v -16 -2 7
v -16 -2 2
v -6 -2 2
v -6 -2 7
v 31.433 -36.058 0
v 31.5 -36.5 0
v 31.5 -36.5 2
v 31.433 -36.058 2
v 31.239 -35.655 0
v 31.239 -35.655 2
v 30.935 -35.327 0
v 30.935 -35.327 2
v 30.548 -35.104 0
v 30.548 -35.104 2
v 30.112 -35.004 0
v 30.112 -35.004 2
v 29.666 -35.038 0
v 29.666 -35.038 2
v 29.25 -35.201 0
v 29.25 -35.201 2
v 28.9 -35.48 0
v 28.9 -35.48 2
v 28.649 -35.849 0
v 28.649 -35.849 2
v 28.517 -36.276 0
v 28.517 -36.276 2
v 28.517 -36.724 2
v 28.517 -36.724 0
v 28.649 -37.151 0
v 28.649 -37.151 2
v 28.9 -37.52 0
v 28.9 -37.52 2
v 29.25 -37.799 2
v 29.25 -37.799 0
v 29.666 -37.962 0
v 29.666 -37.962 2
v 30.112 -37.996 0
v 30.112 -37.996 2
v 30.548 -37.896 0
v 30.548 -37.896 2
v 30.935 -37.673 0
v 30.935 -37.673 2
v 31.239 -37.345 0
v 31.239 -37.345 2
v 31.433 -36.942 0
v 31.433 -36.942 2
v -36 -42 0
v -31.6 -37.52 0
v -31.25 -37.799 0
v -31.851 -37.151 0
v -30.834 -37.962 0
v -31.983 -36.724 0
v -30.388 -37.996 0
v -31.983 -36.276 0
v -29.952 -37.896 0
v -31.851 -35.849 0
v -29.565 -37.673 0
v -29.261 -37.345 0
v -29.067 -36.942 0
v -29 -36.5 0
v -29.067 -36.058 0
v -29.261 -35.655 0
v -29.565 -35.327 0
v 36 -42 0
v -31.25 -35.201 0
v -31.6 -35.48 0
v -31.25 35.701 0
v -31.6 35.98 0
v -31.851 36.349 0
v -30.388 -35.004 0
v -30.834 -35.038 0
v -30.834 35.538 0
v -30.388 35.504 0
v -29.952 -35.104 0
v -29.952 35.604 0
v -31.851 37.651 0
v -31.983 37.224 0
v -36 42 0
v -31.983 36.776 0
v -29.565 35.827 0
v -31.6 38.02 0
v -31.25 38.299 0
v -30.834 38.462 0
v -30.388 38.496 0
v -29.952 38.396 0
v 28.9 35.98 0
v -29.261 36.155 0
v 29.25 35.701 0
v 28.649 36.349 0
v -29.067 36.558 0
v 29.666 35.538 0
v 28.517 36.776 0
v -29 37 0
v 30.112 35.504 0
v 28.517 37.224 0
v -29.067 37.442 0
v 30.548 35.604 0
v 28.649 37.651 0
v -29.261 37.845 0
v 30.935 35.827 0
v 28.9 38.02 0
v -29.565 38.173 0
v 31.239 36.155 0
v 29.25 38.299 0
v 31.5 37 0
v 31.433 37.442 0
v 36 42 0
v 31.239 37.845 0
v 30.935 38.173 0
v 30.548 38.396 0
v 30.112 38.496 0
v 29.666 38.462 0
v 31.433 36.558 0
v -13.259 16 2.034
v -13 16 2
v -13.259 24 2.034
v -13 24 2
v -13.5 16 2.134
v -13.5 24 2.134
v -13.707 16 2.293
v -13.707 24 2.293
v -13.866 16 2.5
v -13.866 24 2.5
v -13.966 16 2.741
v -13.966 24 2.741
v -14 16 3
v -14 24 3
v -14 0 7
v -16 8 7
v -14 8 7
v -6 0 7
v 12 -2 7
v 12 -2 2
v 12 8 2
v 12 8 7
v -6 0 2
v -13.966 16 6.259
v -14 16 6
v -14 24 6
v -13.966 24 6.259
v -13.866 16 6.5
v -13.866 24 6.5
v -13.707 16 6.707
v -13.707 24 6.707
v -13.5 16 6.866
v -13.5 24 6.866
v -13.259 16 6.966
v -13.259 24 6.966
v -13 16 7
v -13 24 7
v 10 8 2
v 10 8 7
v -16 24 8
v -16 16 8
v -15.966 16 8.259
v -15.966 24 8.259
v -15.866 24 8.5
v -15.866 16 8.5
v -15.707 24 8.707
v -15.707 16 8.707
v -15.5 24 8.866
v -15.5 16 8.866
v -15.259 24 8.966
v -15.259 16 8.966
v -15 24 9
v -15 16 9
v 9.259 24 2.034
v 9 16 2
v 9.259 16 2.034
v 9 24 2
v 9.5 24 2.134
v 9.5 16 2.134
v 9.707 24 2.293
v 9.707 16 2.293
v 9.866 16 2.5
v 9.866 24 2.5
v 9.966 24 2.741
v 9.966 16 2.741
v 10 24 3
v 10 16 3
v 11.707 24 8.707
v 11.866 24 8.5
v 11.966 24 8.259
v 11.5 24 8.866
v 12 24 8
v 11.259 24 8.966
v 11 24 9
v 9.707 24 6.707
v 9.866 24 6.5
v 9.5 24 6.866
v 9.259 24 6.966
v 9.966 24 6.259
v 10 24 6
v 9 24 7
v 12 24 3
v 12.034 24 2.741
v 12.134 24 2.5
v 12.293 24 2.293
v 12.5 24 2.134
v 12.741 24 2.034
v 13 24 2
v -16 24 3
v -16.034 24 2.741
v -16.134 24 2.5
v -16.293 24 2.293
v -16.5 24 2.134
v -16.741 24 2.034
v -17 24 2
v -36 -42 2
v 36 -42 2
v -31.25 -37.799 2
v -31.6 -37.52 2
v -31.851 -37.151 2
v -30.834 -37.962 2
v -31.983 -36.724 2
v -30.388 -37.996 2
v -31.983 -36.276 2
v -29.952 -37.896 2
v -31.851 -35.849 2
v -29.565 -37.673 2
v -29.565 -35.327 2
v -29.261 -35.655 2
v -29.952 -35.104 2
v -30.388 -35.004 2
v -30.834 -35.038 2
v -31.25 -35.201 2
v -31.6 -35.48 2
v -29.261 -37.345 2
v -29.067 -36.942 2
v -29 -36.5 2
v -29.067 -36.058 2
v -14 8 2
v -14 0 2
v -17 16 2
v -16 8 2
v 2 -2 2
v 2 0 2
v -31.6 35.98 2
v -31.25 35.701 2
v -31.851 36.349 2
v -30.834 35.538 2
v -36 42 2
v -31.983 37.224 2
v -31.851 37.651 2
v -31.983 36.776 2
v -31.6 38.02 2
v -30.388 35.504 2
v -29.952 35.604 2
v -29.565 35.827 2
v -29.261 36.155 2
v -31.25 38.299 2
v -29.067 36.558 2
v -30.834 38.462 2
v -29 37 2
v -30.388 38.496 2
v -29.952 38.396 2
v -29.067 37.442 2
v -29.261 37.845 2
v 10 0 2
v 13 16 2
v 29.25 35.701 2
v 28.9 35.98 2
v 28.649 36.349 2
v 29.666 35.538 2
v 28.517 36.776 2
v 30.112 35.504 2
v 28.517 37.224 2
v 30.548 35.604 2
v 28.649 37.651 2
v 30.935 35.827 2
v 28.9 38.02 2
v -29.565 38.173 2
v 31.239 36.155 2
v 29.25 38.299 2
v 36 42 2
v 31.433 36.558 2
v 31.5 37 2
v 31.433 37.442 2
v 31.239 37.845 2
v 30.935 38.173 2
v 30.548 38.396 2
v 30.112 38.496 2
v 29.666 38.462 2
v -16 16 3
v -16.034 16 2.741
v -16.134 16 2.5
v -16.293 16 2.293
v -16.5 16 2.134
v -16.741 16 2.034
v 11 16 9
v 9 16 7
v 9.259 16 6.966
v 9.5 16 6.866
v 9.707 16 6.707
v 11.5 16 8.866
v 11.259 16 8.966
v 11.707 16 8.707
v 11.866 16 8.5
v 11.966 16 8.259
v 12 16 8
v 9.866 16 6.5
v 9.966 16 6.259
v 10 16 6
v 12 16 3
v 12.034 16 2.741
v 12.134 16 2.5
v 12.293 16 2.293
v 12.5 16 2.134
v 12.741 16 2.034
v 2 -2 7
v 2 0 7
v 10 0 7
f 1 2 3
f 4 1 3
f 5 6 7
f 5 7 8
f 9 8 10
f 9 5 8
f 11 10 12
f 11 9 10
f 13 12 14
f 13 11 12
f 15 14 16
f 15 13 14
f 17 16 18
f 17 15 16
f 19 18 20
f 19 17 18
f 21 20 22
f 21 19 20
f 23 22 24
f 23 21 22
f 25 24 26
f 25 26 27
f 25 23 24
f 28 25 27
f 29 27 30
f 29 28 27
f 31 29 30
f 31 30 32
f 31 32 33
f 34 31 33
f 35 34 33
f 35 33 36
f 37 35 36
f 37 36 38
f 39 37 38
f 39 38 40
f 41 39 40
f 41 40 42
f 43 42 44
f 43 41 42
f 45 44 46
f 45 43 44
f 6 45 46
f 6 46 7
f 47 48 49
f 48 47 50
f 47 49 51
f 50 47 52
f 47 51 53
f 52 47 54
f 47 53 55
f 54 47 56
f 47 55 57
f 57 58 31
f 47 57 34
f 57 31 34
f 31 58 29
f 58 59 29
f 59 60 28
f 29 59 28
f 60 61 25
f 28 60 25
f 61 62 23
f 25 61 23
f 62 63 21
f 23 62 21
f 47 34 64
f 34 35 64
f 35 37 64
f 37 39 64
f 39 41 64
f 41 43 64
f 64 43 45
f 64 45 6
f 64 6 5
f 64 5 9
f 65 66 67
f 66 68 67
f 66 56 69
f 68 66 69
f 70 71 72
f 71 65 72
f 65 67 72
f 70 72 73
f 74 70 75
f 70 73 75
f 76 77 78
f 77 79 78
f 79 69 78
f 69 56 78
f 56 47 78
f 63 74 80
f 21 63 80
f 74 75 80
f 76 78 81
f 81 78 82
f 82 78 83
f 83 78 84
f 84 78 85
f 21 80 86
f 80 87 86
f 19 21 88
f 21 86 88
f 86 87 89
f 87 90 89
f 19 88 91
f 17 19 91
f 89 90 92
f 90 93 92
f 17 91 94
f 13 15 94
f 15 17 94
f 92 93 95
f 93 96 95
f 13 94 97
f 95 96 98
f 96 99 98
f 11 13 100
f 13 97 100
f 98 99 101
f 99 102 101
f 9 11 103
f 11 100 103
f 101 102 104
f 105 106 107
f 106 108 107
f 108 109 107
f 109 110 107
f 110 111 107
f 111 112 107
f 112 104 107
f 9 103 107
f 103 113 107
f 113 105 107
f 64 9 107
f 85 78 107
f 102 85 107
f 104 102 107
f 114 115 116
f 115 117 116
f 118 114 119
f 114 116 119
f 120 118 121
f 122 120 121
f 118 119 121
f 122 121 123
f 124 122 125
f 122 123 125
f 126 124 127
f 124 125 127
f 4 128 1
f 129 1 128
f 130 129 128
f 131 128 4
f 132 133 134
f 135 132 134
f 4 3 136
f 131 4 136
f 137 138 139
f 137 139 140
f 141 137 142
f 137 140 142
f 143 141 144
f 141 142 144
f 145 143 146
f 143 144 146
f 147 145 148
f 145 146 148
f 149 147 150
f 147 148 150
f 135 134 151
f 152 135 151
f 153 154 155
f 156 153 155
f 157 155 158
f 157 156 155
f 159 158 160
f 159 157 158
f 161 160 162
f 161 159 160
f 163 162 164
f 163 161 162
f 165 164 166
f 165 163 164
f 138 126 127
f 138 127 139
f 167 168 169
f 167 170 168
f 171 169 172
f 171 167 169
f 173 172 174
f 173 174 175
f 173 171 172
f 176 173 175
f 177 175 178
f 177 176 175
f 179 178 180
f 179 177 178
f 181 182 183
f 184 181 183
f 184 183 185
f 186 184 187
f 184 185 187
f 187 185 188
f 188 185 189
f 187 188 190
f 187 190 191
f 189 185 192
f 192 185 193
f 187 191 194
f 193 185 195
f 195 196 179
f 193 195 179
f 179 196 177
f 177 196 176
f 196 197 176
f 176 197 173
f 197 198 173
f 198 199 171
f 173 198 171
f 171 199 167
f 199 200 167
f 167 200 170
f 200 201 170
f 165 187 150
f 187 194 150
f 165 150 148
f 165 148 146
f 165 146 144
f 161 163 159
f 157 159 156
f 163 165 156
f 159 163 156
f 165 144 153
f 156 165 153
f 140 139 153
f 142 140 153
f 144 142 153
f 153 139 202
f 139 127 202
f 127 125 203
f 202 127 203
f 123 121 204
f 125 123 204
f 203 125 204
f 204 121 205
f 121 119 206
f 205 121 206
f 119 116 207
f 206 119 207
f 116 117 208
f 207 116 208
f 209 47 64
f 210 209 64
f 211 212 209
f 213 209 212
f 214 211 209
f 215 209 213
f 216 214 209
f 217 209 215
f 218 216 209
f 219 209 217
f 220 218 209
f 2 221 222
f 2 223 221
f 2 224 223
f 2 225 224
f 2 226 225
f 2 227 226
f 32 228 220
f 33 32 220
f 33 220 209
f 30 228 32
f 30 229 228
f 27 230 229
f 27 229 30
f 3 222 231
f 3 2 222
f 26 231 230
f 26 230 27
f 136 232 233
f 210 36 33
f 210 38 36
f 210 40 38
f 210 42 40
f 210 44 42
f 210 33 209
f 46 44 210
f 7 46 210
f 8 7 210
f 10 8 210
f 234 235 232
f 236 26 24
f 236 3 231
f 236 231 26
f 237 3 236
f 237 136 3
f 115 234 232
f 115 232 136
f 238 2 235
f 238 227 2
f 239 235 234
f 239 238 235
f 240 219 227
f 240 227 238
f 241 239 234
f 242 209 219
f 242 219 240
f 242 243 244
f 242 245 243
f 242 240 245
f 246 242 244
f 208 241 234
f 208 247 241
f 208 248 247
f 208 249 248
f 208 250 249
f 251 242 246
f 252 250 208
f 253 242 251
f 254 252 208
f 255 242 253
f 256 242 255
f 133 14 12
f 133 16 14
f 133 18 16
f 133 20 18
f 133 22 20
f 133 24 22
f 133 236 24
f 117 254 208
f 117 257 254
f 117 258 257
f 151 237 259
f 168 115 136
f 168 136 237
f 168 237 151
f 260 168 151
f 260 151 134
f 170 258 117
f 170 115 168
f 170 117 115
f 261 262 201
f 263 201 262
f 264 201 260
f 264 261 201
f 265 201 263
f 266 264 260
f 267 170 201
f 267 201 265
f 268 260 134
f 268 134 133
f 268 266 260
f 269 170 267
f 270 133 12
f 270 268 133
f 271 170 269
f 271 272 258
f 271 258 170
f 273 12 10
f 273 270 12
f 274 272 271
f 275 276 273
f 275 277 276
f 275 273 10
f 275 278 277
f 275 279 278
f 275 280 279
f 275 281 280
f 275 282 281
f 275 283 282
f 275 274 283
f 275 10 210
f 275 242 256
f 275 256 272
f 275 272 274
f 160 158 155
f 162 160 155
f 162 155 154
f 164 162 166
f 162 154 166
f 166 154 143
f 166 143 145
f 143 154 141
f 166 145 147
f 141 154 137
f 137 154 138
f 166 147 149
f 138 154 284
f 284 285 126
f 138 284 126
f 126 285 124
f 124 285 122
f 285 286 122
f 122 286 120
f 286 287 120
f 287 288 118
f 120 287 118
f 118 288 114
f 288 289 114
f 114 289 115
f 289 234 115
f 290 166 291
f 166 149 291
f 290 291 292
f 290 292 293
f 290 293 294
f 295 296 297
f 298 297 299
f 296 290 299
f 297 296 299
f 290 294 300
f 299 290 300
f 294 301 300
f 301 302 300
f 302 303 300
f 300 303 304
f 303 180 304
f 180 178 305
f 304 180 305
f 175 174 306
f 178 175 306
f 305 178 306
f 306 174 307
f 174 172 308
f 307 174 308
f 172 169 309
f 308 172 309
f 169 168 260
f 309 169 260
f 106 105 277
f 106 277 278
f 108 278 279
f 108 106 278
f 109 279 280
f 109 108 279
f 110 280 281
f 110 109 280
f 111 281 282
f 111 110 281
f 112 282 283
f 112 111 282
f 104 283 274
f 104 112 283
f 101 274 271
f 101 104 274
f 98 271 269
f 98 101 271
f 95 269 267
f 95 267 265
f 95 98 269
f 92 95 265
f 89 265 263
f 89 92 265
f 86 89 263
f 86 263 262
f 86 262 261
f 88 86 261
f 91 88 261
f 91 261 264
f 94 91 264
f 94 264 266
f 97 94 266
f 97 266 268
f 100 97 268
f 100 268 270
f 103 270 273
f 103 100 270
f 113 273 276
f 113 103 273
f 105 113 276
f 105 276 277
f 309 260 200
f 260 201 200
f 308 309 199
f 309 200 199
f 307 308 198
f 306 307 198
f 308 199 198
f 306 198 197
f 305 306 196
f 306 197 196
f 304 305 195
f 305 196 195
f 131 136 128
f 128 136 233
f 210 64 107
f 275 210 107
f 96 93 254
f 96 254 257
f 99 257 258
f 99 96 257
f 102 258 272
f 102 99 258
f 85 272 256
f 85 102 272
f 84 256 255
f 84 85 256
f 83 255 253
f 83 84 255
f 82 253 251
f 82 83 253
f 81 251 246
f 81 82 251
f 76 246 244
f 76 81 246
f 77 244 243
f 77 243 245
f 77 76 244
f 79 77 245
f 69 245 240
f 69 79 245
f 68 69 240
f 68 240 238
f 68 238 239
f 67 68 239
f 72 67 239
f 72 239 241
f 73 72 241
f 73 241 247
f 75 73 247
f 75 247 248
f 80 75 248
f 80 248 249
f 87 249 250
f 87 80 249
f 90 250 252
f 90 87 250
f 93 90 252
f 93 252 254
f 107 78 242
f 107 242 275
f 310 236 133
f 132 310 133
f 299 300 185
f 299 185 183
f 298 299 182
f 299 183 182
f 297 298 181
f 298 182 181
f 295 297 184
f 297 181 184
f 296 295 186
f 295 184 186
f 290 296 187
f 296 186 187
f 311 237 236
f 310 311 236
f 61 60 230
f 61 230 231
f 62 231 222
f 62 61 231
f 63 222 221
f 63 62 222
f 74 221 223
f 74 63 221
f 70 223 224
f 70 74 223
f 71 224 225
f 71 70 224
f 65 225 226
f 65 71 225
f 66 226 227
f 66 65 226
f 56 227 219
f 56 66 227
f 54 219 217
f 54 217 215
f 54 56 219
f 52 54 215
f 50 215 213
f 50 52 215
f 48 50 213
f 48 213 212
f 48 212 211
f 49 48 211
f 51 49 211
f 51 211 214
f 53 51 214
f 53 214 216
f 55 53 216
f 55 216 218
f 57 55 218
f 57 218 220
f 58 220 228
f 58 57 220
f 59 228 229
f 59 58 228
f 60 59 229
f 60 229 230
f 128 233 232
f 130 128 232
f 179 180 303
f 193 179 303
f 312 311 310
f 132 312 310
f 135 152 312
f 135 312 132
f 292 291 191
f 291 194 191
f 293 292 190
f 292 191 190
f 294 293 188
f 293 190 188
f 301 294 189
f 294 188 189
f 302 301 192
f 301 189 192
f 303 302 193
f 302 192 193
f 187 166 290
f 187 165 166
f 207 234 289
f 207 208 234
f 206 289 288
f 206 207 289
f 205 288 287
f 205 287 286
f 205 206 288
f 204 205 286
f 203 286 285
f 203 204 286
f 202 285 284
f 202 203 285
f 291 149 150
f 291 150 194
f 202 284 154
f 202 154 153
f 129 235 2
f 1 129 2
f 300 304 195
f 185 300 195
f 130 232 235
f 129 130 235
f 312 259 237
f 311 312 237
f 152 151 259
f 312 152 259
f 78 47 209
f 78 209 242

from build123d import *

# Parameters (mm, degrees)
F0_W     = 72
F0_H     = 84
F0_R     = 1.5
F1_DEPTH = 2
F2_W     = 2
F2_H     = 8
F2_W_2   = 24
F3_DEPTH = 7
F4_W     = 24
F4_H     = 5
F5_DEPTH = 8
F6_R     = 1
F7_DEPTH = 5


with BuildPart() as f1:
    # F0 (on Top) → F1 (new body)
    with BuildSketch(Plane.XY):
        Rectangle(F0_W, F0_H)
        with Locations((-30.5, -36.5)):
            Circle(F0_R, mode=Mode.SUBTRACT)
        with Locations((30, -36.5)):
            Circle(F0_R, mode=Mode.SUBTRACT)
        with Locations((-30.5, 37)):
            Circle(F0_R, mode=Mode.SUBTRACT)
        with Locations((30, 37)):
            Circle(F0_R, mode=Mode.SUBTRACT)
    extrude(amount=F1_DEPTH)

    # F2 (on face) → F3 (join)
    with BuildSketch(Plane.XY.offset(2)):
        with Locations((-15, 20)):
            Rectangle(F2_W, F2_H)
        with Locations((-2, 20)):
            Rectangle(F2_W_2, F2_H)
        with Locations((11, 20)):
            Rectangle(F2_W, F2_H)
    extrude(amount=F3_DEPTH)

    # F4 (on face) → F5 (cut, through all)
    with BuildSketch(Plane.XZ.offset(-16)):
        with Locations((-2, 4.5)):
            Rectangle(F4_W, F4_H)
    extrude(amount=-F5_DEPTH, mode=Mode.SUBTRACT)

    # F6
    f6_edges = [f1.edges().sort_by_distance(p)[0] for p in [
        (-14, 20, 7),
        (10, 20, 7),
        (12, 20, 9),
        (-16, 20, 9),
        (-16, 20, 2),
        (-14, 20, 2),
        (10, 20, 2),
        (12, 20, 2),
    ]]
    fillet(f6_edges, radius=F6_R)

    # F2 (on face) → F7 (join)
    with BuildSketch(Plane.XY.offset(2)):
        Polygon((12, 8), (10, 8), (10, 0), (2, 0), (2, -2), (12, -2), align=None)
        Polygon((-14, 0), (-14, 8), (-16, 8), (-16, -2), (-6, -2), (-6, 0), align=None)
    extrude(amount=F7_DEPTH)


solid = f1.part
